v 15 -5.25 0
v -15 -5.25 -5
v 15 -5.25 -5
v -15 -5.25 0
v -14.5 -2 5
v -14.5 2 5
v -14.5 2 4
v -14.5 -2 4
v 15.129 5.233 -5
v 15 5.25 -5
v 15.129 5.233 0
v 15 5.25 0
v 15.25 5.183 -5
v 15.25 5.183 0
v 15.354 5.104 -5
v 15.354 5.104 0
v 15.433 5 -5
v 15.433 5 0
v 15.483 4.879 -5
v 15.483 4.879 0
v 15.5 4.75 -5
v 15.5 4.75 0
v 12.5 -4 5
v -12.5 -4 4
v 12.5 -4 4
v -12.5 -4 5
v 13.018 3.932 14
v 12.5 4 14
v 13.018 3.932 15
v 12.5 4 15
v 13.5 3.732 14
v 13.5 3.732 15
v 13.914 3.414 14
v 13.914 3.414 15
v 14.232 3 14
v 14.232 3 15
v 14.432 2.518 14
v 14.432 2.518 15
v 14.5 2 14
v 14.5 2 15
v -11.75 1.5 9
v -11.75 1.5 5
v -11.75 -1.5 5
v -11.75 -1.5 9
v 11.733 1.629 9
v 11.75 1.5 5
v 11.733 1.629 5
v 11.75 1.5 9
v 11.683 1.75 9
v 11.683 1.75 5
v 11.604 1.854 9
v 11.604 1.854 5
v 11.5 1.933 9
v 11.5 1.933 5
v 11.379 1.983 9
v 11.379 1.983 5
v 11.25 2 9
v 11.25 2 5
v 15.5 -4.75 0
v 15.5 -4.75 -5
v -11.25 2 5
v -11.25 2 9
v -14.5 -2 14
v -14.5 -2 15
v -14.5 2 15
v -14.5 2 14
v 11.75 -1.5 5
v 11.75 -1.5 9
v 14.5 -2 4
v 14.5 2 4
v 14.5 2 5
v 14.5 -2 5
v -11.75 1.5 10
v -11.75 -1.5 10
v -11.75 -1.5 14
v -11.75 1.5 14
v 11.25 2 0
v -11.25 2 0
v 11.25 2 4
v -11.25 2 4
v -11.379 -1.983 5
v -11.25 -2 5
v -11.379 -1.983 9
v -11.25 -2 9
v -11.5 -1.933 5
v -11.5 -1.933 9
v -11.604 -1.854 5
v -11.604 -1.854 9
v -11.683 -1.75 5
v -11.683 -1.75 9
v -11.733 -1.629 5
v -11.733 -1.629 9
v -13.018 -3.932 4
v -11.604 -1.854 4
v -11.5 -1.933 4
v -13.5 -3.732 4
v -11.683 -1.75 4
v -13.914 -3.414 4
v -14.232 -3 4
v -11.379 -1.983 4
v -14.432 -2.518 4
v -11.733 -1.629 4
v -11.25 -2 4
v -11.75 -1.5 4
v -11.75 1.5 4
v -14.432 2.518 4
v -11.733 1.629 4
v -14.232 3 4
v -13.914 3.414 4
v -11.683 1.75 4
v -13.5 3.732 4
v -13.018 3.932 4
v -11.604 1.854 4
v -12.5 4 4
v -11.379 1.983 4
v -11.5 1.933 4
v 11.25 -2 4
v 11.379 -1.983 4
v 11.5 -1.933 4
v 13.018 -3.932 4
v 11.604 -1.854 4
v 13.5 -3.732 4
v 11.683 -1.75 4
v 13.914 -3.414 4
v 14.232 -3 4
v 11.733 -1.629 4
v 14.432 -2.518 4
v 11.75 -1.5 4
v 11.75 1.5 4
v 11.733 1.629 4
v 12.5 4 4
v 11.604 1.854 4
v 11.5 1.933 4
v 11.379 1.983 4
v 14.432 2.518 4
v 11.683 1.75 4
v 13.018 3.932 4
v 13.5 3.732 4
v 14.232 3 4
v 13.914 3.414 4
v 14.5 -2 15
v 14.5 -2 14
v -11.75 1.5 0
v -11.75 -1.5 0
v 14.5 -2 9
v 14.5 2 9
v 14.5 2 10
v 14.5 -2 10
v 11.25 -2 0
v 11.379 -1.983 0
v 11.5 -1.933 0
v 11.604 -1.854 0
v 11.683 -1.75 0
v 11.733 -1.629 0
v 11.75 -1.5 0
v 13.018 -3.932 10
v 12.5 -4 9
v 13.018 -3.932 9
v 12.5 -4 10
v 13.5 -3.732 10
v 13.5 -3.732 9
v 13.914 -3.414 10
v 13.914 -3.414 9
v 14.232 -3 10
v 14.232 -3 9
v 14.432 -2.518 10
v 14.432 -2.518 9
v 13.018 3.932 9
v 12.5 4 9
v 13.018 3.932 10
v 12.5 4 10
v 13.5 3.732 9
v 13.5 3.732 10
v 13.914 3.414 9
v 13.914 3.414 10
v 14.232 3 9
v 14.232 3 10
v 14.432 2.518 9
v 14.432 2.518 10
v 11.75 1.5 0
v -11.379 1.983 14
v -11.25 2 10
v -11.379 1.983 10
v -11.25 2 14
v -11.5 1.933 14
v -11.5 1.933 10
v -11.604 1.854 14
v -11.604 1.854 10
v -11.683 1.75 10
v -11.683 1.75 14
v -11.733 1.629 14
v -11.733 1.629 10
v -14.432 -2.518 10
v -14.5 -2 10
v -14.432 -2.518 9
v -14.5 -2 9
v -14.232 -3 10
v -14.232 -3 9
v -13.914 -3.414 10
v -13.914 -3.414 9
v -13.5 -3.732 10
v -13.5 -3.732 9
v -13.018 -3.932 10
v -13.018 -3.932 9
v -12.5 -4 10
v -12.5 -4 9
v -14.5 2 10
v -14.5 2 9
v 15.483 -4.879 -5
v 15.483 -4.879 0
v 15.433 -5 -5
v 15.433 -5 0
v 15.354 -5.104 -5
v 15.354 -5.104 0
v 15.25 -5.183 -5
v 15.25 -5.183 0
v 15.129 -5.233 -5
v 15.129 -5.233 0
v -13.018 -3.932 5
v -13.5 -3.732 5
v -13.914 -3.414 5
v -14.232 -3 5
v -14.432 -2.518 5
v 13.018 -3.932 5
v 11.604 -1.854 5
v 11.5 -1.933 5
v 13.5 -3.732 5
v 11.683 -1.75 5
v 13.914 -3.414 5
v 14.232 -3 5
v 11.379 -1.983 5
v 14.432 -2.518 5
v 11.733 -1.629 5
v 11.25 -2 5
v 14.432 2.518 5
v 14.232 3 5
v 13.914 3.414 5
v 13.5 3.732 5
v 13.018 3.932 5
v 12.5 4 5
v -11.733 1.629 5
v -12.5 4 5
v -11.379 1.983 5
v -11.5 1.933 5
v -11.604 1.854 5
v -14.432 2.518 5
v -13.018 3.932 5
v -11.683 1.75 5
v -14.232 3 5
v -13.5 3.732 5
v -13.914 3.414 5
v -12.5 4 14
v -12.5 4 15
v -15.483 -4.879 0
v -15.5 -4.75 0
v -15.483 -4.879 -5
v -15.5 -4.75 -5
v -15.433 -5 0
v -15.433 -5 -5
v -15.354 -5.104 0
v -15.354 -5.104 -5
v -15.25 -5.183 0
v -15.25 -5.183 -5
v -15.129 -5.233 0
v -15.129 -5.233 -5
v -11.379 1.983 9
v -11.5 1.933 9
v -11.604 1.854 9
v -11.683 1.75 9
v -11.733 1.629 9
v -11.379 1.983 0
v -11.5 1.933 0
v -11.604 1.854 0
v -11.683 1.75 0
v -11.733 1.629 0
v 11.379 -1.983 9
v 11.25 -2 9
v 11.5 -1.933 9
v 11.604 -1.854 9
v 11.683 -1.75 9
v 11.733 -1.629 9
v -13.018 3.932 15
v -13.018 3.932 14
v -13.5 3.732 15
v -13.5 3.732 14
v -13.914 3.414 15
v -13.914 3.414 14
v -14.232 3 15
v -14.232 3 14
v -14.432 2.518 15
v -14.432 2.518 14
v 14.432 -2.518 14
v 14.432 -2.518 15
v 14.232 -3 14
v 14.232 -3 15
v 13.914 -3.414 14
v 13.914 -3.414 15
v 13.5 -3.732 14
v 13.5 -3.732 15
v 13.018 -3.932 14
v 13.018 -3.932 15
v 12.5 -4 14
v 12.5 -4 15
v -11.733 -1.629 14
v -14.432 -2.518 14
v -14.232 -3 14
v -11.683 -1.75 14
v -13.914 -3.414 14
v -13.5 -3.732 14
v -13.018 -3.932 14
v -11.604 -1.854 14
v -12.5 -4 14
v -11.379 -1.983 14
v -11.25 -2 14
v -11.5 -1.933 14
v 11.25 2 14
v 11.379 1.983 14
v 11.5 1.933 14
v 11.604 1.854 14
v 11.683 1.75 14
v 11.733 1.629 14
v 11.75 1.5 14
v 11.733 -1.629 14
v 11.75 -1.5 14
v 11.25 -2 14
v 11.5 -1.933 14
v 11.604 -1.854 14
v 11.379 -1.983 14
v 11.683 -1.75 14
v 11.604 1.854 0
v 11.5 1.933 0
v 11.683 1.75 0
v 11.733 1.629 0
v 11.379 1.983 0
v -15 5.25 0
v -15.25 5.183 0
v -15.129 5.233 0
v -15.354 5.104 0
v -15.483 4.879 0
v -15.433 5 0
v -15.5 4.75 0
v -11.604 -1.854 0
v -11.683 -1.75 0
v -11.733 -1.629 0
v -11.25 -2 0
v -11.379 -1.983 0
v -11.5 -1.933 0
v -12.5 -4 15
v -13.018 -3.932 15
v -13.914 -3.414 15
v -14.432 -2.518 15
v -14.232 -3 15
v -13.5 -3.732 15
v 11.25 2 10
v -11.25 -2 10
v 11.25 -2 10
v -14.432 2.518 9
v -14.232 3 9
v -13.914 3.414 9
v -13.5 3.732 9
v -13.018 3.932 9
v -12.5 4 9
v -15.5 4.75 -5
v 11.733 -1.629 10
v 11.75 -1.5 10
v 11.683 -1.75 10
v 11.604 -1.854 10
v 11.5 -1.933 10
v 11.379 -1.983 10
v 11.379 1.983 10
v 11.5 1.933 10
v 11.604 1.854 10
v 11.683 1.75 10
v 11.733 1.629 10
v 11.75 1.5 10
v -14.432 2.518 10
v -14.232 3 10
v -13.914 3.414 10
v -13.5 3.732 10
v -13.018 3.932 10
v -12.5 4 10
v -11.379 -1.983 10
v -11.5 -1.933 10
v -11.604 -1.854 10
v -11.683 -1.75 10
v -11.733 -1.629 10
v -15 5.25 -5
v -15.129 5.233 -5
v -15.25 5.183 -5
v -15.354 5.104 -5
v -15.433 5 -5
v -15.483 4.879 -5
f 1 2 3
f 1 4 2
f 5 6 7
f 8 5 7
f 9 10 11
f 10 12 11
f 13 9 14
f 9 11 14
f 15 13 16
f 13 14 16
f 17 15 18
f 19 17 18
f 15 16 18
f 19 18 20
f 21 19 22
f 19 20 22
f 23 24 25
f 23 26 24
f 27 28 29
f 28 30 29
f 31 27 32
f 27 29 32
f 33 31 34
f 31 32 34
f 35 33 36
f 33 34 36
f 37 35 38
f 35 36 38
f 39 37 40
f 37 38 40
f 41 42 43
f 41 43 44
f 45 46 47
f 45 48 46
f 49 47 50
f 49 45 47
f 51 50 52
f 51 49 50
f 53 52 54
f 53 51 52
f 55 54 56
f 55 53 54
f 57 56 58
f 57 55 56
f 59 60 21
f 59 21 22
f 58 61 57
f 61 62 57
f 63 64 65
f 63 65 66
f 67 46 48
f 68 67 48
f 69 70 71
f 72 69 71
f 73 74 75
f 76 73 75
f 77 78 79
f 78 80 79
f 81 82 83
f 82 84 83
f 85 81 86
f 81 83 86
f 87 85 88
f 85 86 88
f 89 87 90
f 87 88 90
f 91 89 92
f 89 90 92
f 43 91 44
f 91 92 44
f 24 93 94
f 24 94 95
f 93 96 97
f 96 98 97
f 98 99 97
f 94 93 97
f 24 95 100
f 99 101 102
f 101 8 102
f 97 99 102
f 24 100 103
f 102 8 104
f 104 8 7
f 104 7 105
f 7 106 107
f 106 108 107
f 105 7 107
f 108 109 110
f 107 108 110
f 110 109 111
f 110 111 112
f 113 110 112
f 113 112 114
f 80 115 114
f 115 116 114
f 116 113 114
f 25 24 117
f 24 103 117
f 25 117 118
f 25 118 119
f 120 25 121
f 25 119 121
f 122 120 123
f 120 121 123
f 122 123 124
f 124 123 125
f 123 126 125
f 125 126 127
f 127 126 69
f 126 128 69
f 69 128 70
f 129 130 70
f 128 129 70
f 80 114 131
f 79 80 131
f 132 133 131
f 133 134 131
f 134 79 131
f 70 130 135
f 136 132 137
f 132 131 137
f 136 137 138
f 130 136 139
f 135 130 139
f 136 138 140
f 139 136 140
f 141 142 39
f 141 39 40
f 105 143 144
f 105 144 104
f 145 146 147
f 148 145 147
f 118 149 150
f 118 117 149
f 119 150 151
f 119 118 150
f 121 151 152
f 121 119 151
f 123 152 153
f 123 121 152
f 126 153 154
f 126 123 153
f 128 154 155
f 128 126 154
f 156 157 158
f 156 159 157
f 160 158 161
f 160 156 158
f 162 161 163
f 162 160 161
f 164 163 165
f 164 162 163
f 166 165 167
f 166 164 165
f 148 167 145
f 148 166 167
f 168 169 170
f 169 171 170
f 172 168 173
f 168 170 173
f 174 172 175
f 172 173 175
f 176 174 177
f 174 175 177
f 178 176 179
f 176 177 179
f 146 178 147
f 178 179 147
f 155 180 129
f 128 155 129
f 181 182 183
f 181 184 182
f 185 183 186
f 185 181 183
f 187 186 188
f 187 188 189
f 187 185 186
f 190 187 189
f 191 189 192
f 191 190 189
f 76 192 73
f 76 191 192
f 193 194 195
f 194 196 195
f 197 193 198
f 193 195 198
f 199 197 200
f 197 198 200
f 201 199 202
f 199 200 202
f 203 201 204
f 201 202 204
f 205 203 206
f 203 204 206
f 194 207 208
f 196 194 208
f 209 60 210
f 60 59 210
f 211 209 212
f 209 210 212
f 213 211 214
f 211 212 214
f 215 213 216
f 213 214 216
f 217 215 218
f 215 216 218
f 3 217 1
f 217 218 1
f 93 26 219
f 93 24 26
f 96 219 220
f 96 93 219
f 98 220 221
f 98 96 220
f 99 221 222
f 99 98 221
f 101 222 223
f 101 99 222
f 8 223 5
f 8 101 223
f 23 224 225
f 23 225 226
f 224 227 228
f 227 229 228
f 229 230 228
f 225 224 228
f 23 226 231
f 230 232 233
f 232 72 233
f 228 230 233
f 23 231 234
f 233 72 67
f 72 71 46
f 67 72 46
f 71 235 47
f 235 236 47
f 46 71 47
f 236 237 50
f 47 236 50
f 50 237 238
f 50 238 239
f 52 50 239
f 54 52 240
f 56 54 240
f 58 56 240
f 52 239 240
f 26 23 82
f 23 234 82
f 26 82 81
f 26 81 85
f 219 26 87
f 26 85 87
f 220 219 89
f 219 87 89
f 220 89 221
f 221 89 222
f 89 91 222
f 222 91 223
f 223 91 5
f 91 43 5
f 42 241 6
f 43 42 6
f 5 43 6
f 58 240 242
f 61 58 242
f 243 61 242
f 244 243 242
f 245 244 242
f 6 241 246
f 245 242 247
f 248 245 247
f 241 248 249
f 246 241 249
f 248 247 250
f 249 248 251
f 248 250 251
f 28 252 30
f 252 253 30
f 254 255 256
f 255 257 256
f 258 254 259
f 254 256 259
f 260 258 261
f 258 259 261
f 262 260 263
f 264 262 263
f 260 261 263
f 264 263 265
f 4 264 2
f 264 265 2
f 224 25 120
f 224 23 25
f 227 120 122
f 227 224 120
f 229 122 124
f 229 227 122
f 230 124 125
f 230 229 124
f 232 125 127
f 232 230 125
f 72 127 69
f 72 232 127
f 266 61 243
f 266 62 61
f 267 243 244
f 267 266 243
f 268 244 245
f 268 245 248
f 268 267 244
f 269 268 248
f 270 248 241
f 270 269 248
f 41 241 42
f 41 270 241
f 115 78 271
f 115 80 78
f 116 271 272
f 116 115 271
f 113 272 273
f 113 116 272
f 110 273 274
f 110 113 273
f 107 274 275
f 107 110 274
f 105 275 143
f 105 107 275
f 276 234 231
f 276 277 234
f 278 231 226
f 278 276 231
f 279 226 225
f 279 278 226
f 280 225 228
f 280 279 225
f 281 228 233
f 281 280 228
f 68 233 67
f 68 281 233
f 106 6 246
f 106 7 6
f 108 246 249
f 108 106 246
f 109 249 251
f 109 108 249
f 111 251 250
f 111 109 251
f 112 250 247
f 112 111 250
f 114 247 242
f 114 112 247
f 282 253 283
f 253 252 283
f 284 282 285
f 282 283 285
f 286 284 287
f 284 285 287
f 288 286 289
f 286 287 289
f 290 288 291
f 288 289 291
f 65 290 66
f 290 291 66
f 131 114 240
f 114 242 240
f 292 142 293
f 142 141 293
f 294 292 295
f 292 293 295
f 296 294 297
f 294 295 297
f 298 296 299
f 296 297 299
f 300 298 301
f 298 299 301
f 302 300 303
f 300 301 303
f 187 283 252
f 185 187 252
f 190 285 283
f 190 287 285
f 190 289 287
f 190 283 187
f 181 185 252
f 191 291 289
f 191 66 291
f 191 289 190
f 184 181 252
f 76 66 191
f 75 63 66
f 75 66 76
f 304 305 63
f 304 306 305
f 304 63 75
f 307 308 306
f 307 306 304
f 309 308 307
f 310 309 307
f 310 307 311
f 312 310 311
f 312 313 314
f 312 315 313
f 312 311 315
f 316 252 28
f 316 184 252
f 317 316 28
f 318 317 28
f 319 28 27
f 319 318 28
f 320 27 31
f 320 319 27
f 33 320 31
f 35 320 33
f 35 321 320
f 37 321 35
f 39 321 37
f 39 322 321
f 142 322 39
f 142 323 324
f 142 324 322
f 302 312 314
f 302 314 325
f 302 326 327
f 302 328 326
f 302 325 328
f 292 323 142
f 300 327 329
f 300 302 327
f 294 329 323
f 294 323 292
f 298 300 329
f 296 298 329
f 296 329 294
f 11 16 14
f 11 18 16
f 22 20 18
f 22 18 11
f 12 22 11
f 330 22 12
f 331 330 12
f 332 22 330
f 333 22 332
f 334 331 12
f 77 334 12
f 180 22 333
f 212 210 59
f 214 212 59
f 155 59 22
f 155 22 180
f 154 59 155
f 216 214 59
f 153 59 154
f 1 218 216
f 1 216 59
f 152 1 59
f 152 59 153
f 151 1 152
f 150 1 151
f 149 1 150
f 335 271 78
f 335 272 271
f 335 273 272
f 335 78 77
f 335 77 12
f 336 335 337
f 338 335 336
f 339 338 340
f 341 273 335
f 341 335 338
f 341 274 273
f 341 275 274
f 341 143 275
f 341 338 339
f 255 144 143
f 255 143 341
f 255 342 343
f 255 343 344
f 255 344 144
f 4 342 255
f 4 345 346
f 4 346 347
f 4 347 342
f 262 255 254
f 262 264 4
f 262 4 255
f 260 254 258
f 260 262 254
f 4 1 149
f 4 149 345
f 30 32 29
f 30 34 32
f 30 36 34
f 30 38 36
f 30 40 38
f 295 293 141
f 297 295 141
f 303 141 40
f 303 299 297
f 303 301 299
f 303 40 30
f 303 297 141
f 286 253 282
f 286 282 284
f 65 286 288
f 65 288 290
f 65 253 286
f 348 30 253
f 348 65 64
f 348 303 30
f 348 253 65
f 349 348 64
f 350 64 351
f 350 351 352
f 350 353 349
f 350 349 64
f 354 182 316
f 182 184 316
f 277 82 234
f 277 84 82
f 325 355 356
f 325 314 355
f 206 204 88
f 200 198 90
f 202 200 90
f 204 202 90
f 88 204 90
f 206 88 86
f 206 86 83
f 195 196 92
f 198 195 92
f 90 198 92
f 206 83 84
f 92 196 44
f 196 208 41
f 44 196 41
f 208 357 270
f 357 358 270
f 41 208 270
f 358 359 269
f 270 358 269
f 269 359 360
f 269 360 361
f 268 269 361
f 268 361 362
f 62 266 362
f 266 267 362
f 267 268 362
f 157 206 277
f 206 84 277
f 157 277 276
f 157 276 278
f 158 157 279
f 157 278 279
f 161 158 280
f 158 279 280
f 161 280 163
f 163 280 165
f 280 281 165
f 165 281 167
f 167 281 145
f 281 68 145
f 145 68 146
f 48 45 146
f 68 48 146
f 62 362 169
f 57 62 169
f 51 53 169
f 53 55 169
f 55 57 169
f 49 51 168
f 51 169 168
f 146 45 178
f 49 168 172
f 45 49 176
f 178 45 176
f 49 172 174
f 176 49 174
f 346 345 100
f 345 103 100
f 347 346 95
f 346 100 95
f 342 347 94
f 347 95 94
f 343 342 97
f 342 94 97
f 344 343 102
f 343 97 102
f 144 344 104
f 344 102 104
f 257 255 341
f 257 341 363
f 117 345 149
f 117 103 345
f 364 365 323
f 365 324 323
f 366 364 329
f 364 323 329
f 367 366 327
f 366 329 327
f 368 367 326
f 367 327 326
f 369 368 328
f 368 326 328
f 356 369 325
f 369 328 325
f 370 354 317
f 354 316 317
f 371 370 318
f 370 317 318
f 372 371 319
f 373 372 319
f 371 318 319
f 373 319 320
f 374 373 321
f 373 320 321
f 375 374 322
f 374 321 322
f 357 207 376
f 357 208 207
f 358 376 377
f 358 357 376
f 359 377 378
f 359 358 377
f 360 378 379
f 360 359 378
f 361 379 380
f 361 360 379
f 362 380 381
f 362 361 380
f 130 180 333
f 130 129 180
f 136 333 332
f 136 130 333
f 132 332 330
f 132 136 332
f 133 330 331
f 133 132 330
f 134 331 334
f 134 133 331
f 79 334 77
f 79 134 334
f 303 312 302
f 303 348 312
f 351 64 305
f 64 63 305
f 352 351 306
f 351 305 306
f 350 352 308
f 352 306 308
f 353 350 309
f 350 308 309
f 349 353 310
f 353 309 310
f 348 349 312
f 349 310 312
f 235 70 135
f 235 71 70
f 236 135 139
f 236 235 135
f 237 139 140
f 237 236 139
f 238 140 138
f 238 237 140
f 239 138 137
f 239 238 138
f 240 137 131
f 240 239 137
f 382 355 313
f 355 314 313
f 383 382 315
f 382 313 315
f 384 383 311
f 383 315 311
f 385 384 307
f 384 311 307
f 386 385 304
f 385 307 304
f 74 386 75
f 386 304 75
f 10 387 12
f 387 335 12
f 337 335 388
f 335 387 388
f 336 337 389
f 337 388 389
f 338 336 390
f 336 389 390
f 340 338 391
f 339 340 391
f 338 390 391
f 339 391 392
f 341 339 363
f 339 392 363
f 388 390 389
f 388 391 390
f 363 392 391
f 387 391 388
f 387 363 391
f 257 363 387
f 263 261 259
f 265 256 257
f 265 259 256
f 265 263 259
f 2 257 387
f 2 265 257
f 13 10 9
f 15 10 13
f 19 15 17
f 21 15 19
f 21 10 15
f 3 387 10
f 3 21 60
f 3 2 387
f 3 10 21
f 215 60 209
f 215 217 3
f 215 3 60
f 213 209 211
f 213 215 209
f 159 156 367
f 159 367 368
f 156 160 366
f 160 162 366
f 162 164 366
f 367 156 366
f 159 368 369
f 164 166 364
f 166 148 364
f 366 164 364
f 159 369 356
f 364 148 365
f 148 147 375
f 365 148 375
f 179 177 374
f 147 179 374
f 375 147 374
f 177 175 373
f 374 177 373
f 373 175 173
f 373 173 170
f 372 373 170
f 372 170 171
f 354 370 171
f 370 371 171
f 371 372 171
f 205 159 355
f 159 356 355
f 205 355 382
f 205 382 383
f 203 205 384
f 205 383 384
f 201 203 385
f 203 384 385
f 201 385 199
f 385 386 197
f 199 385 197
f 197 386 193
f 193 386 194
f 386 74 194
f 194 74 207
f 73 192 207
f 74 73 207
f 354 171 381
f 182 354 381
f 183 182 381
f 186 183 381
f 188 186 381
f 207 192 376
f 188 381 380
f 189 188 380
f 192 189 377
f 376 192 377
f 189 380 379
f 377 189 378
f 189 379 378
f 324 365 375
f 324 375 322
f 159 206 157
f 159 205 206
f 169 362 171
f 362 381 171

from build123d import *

# Parameters (mm, degrees)
F1_DEPTH = 5.25
F2_DEPTH = 4
F0_W     = 23.5
F0_H     = 4
F3_DEPTH = 2
F4_R     = 0.5
F5_R     = 2


with BuildPart() as f1:
    # F0 (on Front) → F1 (new body, symmetric)
    with BuildSketch(Plane.XZ):
        Polygon((-11.75, 0), (-15.5, 0), (-15.5, -5), (15.5, -5), (15.5, 0), (11.75, 0), align=None)
    extrude(amount=F1_DEPTH, both=True)



with BuildPart() as f2:
    # F0 (on Front) → F2 (new body, symmetric)
    with BuildSketch(Plane.XZ):
        Polygon((-14.5, 4), (-11.75, 4), (11.75, 4), (14.5, 4), (14.5, 5), (11.75, 5), (-11.75, 5), (-14.5, 5), align=None)
        Polygon((-14.5, 9), (-11.75, 9), (11.75, 9), (14.5, 9), (14.5, 10), (11.75, 10), (-11.75, 10), (-14.5, 10), align=None)
        Polygon((-14.5, 14), (-11.75, 14), (11.75, 14), (14.5, 14), (14.5, 15), (-14.5, 15), align=None)
    extrude(amount=F2_DEPTH, both=True)


with BuildPart() as f1_1:
    add(f1.part)

    add(f2.part)  # F3 merges F2
    # F0 (on Front) → F3 (join, symmetric)
    with BuildSketch(Plane.XZ):
        with Locations((0, 2)):
            Rectangle(F0_W, F0_H)
        with Locations((0, 7)):
            Rectangle(F0_W, F0_H)
        with Locations((0, 12)):
            Rectangle(F0_W, F0_H)
    extrude(amount=F3_DEPTH, both=True)

    # F4
    f4_edges = [f1_1.edges().sort_by_distance(p)[0] for p in [
        (15.5, -5.25, -2.5),
        (15.5, 5.25, -2.5),
        (-15.5, -5.25, -2.5),
        (-11.75, -2, 2),
        (-11.75, -2, 7),
        (-11.75, -2, 12),
        (11.75, -2, 2),
        (11.75, -2, 7),
        (11.75, -2, 12),
        (11.75, 2, 2),
        (11.75, 2, 7),
        (11.75, 2, 12),
        (-15.5, 5.25, -2.5),
        (-11.75, 2, 2),
        (-11.75, 2, 7),
        (-11.75, 2, 12),
    ]]
    fillet(f4_edges, radius=F4_R)

    # F5
    f5_edges = [f1_1.edges().sort_by_distance(p)[0] for p in [
        (-14.5, 4, 4.5),
        (-14.5, 4, 9.5),
        (-14.5, 4, 14.5),
        (-14.5, -4, 14.5),
        (-14.5, -4, 9.5),
        (-14.5, -4, 4.5),
        (14.5, -4, 14.5),
        (14.5, -4, 9.5),
        (14.5, -4, 4.5),
        (14.5, 4, 4.5),
        (14.5, 4, 9.5),
        (14.5, 4, 14.5),
    ]]
    fillet(f5_edges, radius=F5_R)


solid = f1_1.part
